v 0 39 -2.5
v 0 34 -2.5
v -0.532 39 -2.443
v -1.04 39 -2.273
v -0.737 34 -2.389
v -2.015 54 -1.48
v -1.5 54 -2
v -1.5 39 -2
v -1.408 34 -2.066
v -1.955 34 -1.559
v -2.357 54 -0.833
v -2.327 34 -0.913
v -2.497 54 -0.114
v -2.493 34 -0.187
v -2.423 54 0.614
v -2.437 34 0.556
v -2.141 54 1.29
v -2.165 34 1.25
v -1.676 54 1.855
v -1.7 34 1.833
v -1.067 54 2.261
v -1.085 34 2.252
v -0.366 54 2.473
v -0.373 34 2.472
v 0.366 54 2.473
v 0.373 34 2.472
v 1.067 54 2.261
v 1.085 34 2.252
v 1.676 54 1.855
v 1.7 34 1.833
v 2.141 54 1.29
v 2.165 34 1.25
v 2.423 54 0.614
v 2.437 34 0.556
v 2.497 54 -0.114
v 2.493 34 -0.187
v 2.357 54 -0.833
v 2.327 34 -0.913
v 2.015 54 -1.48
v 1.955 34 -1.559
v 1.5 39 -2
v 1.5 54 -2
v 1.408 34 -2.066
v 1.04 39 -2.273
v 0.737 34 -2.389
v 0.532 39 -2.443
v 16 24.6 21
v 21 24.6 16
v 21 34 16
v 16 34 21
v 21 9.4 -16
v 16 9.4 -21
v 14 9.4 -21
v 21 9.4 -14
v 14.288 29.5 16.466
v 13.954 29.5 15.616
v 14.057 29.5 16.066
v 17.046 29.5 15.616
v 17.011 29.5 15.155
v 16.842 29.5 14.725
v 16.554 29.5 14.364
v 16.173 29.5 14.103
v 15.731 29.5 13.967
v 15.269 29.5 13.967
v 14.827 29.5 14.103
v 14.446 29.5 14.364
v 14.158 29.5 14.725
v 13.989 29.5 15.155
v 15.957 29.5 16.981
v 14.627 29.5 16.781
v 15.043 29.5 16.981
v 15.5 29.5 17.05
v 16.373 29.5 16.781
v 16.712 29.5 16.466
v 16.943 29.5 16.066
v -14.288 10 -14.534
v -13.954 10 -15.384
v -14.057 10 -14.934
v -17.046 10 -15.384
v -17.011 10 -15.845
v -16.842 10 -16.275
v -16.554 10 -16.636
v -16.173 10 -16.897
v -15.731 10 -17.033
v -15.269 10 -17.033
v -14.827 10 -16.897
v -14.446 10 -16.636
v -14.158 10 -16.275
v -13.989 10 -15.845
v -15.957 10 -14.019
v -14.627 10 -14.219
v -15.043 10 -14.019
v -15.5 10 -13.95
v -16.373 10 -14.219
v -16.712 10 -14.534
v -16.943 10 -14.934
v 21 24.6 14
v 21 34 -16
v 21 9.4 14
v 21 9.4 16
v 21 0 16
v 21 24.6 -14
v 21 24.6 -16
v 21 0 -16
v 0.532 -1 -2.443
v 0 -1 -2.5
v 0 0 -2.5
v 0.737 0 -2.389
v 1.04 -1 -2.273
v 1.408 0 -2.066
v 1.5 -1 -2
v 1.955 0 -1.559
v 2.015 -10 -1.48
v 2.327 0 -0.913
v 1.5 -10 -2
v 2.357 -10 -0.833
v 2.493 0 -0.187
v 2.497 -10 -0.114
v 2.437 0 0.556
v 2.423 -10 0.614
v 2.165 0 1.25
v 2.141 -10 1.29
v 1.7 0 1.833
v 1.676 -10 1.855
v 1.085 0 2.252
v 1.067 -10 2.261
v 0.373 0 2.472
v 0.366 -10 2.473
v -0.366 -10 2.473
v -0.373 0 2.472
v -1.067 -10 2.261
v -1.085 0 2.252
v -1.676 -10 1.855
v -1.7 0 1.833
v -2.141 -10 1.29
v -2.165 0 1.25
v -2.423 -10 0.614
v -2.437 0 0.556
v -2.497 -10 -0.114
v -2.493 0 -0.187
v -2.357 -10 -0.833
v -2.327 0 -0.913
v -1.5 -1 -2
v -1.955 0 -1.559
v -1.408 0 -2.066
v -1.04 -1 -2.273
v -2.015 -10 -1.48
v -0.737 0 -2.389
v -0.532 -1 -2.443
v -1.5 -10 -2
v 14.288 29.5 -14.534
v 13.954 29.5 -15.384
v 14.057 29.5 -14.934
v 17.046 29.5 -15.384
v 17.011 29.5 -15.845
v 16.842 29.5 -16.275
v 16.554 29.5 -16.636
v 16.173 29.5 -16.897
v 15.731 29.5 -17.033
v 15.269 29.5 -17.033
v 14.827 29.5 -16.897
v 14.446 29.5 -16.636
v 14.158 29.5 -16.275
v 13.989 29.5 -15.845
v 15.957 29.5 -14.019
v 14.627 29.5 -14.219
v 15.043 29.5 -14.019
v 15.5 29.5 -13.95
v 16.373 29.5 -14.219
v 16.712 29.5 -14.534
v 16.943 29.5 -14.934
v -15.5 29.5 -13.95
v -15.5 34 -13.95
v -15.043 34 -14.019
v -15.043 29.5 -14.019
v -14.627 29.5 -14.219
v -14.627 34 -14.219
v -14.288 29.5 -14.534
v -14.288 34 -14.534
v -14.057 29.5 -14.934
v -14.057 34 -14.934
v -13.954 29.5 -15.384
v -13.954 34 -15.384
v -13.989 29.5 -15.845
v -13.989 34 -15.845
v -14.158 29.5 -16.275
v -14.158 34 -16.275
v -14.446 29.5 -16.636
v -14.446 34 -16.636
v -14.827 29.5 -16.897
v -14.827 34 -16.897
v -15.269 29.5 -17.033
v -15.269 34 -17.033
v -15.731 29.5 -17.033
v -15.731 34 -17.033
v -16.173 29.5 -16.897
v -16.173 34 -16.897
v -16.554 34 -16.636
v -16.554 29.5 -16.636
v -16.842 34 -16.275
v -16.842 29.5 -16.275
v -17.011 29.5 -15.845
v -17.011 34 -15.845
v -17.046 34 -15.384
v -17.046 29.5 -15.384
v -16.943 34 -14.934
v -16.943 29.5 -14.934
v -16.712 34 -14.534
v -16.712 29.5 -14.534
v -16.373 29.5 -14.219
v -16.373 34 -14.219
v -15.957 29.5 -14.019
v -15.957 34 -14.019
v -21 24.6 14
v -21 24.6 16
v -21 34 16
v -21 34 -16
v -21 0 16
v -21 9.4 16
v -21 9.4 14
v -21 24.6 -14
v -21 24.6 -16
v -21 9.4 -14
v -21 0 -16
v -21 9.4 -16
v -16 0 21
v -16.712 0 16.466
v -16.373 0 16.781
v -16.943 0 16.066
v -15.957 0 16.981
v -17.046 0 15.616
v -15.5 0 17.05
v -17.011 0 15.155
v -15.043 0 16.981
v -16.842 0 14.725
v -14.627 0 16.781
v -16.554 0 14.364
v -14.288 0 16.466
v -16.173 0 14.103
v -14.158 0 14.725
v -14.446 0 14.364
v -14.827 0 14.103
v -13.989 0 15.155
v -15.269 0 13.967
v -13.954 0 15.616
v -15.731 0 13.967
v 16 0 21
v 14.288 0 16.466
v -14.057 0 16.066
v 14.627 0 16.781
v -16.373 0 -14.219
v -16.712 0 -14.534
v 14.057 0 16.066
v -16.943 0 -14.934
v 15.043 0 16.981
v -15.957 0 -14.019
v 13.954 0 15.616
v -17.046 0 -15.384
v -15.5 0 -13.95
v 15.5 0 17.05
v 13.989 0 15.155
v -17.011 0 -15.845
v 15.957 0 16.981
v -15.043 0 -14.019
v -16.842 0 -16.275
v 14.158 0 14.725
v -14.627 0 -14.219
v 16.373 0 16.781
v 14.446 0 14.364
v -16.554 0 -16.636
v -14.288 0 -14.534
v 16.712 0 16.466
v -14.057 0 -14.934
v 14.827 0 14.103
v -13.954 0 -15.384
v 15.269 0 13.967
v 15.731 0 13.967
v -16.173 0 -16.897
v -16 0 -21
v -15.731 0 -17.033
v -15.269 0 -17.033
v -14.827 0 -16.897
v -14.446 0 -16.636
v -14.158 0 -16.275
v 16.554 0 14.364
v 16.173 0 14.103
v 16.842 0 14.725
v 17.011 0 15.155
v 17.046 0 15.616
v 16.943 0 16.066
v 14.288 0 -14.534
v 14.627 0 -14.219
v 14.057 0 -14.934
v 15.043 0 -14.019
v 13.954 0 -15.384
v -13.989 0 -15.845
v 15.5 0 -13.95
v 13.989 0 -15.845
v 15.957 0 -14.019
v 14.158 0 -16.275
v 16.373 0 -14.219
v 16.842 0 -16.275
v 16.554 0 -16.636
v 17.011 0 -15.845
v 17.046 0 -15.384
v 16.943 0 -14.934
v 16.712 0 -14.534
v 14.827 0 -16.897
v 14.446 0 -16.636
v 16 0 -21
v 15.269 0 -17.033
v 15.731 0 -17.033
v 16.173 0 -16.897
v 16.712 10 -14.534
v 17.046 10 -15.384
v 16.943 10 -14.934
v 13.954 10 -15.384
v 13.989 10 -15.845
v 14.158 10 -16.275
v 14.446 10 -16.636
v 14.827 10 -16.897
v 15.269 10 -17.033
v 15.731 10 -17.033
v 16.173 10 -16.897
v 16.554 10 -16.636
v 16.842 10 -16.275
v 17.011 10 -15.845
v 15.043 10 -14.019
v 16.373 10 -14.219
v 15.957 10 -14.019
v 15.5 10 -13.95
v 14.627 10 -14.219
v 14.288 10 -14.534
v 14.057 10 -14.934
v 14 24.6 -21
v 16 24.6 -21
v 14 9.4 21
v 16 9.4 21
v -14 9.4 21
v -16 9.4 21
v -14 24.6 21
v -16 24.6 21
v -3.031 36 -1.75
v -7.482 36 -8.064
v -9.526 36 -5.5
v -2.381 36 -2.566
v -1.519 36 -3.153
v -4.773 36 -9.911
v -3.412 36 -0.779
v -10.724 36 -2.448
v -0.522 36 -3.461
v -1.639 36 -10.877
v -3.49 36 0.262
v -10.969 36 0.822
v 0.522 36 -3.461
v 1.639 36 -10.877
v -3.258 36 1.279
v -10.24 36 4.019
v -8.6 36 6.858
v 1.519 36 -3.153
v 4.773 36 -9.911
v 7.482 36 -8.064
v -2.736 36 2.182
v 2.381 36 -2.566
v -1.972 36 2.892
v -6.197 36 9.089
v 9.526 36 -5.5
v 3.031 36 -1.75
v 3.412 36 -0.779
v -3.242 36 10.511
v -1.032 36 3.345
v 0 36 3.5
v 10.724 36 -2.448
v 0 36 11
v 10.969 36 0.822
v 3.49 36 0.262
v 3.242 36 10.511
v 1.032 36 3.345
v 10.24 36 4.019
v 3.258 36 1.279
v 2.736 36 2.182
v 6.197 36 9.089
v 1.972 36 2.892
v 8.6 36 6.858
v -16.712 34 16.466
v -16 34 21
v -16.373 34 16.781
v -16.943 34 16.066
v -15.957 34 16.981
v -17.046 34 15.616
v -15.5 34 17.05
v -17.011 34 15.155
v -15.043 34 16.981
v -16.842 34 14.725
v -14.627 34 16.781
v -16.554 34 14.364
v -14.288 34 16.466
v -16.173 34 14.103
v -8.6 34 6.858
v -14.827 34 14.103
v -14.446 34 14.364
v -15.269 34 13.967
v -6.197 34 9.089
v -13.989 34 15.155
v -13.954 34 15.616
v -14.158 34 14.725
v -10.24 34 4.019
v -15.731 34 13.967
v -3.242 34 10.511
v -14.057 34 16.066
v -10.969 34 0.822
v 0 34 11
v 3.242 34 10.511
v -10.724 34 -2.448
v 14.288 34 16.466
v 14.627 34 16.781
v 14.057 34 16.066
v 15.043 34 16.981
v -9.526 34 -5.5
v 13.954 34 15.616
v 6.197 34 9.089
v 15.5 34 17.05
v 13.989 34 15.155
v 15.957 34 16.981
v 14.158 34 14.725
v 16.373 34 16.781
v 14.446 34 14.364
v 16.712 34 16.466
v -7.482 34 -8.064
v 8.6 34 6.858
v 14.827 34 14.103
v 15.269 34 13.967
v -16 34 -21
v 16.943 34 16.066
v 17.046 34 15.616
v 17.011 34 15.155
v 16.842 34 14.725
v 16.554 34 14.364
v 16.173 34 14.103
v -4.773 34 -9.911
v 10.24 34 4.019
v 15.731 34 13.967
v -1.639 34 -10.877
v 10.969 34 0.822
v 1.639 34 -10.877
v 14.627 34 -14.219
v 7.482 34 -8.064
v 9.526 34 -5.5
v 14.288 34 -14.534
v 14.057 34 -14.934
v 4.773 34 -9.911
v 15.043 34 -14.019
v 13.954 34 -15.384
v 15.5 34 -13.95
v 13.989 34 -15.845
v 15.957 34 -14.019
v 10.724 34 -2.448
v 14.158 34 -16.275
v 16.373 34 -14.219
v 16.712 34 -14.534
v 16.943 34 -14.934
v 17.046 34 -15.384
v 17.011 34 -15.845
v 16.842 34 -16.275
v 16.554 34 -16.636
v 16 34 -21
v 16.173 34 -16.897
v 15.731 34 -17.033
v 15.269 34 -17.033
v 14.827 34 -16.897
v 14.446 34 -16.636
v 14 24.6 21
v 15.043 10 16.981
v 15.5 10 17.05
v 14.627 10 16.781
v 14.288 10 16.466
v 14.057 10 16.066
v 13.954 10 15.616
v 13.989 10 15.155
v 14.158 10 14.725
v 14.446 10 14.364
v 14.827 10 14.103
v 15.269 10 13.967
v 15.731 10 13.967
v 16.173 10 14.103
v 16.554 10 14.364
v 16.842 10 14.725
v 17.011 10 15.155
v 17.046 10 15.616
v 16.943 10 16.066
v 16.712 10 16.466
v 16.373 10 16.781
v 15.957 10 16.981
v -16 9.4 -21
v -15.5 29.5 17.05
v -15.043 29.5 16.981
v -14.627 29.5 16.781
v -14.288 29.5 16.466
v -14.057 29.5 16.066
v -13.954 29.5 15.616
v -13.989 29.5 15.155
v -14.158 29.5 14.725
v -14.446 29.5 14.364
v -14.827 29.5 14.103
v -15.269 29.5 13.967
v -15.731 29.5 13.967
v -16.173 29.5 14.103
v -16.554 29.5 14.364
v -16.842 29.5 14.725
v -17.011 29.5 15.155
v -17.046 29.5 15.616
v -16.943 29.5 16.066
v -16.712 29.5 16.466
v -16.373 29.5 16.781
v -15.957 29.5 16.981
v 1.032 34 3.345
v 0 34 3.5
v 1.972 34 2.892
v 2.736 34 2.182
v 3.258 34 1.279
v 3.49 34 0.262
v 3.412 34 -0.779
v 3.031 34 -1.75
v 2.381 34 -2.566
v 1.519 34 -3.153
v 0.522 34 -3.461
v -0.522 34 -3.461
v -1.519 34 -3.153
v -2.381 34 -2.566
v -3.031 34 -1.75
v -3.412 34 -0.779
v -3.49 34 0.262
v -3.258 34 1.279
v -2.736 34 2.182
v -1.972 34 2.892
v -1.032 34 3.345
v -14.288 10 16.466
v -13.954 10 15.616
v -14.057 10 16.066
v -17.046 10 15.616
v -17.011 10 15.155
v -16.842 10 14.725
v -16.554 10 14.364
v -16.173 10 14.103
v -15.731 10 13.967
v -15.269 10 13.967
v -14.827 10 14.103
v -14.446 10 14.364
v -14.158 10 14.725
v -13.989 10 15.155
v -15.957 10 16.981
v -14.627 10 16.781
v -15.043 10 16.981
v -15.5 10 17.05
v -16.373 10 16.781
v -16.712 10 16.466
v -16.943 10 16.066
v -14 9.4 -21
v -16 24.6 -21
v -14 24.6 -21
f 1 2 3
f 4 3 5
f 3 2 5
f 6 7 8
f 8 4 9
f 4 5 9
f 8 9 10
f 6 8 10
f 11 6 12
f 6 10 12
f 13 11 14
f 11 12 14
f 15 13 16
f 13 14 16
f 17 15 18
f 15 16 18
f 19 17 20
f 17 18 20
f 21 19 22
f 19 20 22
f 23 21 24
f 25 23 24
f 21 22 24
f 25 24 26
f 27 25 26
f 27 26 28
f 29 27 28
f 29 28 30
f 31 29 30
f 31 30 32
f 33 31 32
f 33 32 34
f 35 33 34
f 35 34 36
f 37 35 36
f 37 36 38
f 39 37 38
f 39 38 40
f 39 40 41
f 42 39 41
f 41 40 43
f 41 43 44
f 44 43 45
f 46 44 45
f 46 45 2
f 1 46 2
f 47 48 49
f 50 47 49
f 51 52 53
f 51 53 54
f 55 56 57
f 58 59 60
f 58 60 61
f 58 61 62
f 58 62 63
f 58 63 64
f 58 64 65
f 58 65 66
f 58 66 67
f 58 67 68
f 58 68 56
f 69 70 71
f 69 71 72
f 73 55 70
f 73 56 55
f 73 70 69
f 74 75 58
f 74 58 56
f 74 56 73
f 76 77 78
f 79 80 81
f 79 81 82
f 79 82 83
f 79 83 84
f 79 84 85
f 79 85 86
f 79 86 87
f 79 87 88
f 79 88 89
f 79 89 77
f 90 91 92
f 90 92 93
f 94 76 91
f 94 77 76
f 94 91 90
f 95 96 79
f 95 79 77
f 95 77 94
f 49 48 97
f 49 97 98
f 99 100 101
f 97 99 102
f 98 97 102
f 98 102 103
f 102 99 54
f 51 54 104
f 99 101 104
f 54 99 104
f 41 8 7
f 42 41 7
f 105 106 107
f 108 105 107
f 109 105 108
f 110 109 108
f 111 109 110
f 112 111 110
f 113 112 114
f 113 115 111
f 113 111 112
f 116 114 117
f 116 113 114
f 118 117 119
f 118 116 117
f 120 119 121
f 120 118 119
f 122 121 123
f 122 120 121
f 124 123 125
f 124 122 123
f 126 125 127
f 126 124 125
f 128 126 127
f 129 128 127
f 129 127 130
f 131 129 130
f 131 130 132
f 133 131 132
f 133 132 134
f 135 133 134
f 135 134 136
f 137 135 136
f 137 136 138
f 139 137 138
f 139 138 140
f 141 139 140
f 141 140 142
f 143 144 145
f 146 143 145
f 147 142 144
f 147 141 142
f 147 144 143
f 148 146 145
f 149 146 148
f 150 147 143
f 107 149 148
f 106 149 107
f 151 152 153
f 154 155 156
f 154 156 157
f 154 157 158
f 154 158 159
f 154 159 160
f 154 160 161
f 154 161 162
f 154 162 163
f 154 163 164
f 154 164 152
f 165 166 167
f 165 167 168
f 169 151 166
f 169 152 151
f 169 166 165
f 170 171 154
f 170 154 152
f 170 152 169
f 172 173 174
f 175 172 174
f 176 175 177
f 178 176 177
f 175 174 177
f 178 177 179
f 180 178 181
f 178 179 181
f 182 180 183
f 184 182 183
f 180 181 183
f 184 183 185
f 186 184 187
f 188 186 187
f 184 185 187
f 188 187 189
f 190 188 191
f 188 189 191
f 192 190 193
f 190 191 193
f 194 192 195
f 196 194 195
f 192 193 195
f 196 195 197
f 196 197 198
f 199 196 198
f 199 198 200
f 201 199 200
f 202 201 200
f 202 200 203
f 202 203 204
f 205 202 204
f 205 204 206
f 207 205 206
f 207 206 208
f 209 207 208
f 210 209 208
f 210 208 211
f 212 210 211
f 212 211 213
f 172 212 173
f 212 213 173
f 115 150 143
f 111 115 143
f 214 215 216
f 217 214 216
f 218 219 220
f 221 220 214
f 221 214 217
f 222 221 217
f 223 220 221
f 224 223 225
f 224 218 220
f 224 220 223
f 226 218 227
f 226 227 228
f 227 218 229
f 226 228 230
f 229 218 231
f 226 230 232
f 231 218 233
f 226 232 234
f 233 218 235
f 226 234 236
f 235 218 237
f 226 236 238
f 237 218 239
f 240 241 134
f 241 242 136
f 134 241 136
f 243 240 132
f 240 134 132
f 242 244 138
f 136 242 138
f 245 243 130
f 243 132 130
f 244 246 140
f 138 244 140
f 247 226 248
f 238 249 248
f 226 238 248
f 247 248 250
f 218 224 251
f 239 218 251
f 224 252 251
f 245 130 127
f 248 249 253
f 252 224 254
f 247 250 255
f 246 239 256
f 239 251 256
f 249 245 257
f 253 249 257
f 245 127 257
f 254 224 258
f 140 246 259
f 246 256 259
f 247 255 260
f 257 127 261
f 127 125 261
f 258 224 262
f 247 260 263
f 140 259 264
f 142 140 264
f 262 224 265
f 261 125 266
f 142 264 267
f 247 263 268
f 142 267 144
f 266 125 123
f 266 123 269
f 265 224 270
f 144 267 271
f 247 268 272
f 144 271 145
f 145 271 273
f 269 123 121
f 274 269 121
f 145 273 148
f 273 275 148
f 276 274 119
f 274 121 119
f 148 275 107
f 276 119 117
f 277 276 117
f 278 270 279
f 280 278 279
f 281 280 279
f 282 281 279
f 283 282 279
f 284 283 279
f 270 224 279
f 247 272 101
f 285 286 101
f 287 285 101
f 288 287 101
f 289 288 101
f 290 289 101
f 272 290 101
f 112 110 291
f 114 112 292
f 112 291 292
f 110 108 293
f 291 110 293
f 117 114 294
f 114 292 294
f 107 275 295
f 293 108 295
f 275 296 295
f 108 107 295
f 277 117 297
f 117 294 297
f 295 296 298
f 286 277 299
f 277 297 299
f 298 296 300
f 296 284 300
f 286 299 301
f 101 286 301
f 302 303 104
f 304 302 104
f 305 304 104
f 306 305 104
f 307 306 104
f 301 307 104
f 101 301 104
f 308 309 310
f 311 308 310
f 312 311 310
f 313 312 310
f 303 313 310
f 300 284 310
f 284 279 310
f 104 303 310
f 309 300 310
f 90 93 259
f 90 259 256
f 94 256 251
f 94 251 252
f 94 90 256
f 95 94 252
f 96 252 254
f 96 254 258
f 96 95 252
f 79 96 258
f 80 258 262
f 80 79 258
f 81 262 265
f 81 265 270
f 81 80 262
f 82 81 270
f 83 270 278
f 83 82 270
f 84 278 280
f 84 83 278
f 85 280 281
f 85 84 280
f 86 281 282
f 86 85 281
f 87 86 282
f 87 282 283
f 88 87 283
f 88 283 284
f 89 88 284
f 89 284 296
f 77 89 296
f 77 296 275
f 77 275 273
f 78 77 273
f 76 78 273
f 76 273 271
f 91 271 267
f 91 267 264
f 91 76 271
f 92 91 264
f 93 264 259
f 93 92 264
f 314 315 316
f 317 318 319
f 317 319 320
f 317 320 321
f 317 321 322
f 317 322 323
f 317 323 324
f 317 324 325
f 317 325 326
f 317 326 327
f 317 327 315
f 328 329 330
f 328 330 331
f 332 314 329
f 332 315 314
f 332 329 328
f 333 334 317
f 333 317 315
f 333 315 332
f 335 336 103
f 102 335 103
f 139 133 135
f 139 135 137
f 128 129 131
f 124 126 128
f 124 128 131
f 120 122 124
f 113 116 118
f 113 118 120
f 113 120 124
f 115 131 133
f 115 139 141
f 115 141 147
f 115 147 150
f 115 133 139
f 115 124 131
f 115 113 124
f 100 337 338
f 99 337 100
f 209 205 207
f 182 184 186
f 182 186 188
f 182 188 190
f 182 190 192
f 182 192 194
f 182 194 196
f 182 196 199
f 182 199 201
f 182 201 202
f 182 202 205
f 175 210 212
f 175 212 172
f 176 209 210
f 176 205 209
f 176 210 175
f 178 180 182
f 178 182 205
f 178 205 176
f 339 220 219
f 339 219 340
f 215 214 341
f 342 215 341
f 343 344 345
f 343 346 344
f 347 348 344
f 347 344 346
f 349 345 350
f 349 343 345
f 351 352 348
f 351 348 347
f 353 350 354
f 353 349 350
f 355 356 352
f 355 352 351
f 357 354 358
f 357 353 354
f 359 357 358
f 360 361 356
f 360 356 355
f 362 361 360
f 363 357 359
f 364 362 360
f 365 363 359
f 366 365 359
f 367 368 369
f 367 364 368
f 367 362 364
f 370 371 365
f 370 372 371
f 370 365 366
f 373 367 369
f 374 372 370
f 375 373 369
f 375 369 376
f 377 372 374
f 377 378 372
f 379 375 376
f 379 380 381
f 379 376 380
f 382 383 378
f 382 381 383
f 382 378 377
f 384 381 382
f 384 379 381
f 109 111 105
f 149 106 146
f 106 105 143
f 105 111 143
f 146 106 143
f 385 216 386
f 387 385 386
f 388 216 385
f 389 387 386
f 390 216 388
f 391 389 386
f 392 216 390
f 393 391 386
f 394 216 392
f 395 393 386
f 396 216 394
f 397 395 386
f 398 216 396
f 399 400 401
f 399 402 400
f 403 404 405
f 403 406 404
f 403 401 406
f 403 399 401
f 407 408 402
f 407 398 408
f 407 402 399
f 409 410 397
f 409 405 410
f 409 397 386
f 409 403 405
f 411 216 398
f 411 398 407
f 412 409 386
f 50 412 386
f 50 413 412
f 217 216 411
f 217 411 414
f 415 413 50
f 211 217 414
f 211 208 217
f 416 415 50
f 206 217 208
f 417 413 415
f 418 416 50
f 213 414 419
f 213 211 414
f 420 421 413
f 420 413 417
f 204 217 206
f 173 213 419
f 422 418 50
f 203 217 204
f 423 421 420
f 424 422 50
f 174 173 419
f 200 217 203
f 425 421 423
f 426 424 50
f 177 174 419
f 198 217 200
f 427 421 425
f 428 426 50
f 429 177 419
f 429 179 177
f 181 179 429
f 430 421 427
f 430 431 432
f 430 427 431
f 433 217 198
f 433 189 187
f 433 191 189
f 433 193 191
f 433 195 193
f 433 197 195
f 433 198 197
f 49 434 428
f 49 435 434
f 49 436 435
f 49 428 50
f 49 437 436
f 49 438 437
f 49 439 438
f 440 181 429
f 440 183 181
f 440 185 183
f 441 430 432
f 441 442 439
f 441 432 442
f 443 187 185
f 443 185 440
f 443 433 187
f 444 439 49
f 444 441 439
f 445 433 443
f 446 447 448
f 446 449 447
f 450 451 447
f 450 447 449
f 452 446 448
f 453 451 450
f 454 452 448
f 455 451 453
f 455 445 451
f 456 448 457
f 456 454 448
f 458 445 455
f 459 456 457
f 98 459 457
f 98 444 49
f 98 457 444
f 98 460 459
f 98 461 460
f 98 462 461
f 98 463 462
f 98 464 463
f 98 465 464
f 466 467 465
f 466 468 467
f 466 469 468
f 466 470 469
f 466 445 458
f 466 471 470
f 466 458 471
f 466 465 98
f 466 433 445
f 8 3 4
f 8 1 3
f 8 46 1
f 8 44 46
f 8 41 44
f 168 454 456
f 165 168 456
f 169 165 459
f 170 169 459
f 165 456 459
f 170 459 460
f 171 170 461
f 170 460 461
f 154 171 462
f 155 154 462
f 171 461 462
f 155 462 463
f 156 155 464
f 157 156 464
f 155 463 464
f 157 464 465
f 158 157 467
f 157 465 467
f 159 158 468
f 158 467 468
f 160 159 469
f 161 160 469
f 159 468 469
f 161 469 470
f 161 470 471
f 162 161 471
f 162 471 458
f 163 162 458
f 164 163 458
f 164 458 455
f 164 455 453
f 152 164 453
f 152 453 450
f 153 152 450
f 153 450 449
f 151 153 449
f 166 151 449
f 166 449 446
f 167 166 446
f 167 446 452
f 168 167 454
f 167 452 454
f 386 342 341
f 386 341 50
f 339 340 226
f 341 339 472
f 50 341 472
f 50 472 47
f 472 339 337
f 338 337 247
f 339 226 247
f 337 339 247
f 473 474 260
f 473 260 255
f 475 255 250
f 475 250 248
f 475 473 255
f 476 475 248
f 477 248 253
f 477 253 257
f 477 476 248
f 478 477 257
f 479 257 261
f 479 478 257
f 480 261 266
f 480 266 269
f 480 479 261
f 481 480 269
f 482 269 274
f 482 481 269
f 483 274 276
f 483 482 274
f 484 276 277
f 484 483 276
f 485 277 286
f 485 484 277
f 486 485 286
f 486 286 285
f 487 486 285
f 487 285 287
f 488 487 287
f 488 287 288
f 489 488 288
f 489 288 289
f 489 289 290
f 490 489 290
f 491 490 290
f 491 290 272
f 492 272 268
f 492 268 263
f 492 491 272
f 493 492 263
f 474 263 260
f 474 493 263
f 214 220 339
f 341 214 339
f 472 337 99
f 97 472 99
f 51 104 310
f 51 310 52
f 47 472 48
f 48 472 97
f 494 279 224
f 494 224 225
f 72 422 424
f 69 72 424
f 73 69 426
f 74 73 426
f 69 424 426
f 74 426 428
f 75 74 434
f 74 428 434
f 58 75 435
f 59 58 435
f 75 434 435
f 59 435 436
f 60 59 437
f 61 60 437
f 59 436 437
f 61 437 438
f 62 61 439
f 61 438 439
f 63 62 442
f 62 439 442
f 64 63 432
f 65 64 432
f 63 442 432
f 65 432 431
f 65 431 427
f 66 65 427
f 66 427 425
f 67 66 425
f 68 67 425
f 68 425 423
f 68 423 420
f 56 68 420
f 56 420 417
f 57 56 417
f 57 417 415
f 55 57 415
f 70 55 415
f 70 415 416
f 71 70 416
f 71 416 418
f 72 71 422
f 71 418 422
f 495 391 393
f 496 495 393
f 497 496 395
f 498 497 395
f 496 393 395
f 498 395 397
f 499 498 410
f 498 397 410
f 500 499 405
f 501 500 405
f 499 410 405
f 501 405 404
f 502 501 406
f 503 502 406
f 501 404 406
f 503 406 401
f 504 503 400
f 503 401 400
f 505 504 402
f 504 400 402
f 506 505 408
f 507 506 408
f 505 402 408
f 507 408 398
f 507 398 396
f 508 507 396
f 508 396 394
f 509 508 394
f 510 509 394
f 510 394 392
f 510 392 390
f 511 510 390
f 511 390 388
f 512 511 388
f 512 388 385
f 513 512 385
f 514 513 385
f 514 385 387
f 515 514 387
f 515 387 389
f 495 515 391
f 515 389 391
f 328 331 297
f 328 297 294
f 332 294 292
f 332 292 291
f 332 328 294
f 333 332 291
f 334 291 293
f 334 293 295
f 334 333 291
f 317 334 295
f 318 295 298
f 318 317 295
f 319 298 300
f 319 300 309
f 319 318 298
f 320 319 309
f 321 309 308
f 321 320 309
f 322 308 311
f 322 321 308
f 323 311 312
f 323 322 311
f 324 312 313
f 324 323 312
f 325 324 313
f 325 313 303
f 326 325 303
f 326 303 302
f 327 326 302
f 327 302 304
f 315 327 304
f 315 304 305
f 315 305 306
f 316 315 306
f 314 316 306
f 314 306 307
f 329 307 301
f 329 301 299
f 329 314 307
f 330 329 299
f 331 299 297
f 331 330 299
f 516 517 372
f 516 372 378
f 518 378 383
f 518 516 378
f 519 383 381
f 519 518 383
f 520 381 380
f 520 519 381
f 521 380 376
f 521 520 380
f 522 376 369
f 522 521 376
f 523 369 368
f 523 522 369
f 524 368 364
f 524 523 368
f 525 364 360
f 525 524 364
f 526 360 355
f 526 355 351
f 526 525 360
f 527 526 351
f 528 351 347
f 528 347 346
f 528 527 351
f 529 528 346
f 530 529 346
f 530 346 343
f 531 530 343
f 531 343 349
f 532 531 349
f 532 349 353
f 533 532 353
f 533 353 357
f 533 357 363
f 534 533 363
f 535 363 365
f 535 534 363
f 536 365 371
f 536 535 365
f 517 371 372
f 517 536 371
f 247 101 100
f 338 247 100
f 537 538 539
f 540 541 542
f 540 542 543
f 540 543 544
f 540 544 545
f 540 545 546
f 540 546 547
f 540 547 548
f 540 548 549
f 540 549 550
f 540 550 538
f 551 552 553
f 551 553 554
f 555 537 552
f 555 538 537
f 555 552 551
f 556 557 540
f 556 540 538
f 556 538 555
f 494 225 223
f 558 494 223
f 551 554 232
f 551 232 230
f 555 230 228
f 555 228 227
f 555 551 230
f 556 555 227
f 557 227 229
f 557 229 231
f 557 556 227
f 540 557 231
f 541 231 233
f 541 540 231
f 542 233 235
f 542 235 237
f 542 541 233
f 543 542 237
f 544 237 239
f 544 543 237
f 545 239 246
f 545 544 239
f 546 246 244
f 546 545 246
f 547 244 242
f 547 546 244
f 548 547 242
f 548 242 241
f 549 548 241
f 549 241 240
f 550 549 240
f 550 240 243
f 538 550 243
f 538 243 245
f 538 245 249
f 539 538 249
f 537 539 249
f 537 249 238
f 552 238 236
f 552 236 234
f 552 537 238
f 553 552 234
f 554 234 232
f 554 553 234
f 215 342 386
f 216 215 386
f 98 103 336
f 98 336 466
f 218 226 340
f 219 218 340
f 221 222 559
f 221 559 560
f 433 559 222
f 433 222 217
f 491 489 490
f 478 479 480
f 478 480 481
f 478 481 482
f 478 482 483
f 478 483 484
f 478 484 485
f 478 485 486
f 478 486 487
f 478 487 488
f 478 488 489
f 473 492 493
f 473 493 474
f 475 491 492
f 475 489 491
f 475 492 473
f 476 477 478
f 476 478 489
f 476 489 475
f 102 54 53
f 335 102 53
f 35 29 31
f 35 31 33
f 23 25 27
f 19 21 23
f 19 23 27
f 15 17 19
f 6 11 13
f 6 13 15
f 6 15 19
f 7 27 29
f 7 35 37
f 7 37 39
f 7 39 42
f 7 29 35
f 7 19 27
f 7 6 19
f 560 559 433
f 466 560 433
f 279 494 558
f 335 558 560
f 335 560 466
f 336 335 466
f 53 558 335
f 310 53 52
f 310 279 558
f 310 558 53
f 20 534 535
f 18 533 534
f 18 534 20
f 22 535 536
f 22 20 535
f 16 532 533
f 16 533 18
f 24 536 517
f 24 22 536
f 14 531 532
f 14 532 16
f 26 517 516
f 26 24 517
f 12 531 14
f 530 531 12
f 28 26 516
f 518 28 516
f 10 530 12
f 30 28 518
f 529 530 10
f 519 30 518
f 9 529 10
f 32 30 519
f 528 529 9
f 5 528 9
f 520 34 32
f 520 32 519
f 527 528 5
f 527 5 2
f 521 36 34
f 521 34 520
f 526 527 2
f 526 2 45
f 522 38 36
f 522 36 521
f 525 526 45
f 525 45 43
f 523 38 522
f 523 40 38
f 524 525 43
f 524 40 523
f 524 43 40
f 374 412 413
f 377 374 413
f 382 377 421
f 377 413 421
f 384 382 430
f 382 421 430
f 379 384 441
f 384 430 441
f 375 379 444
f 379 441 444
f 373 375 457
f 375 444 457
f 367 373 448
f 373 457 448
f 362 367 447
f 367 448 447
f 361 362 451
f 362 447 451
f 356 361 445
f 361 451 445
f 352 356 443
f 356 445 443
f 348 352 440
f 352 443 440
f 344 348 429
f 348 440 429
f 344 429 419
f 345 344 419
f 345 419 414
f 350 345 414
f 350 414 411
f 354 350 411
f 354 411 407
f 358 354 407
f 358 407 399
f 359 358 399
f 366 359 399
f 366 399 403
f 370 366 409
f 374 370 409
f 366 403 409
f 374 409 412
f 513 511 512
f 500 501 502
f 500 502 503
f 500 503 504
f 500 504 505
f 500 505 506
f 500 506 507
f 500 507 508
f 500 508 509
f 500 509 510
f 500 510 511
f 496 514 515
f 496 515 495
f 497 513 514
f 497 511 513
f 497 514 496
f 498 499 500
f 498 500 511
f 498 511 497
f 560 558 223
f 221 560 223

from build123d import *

# Parameters (mm, degrees)
SKETCH4_W               = 42
SKETCH4_H               = 42
BOTTOM_DEPTH            = 9.4
MIDDLE_DEPTH            = 15.2
SKETCH8_W               = 42
SKETCH8_H               = 42
TOP_DEPTH               = 9.4
CHAMFER1_SIZE           = 5
SKETCH9_R               = 11
SKETCH9_R_2             = 3.5
RING_DEPTH              = 2
SKETCH10_R              = 2.5
SHAFT_DEPTH             = 20
SKETCH12_R              = 1.55
CUT_EXTRUDE4_DEPTH      = 4.5
CUT_EXTRUDE5_START      = -10
SKETCH15_R              = 1.55
CUT_EXTRUDE5_DEPTH      = 10
BOSS_EXTRUDE1_START     = 10
SKETCH16_R              = 2.5
BOSS_EXTRUDE1_DEPTH     = 10
CUT_EXTRUDE3_DEPTH      = 5
CUT_EXTRUDE3_DEPTH_BACK = 5
SKETCH11_W              = 1.458446266
SKETCH11_H              = 24.242457261
SKETCH11_W_2            = 8.851647276
SKETCH11_H_2            = 12.03282496


with BuildPart() as part:
    # Sketch4 → Bottom (new body)
    with BuildSketch(Plane(origin=(0, 0, 0), x_dir=(1, 0, 0), z_dir=(0, 1, 0))):
        Rectangle(SKETCH4_W, SKETCH4_H)
    extrude(amount=BOTTOM_DEPTH)

    # Sketch6 → Middle (add)
    with BuildSketch(Plane(origin=(0, 9.4, 0), x_dir=(1, 0, 0), z_dir=(0, 1, 0))):
        Polygon((-21, -14), (-14, -21), (14, -21), (21, -14), (21, 14), (14, 21), (-14, 21), (-21, 14), align=None)
    extrude(amount=MIDDLE_DEPTH)

    # Sketch8 → Top (add)
    with BuildSketch(Plane(origin=(0, 24.6, 0), x_dir=(1, 0, 0), z_dir=(0, 1, 0))):
        Rectangle(SKETCH8_W, SKETCH8_H)
    extrude(amount=TOP_DEPTH)

    # Chamfer1
    chamfer1_edges = [part.edges().sort_by_distance(p)[0] for p in [
        (21, 29.3, 21),
        (21, 29.3, -21),
        (-21, 29.3, -21),
        (-21, 29.3, 21),
        (-21, 4.7, 21),
        (-21, 4.7, -21),
        (21, 4.7, -21),
        (21, 4.7, 21),
    ]]
    chamfer(chamfer1_edges, length=CHAMFER1_SIZE)

    # Sketch9 → Ring (add)
    with BuildSketch(Plane(origin=(0, 34, 0), x_dir=(1, 0, 0), z_dir=(0, 1, 0))):
        with Locations(Location((0, 0, 0), (0, 0, 270))):
            Circle(SKETCH9_R)
        with Locations(Location((0, 0, 0), (0, 0, 270))):
            Circle(SKETCH9_R_2, mode=Mode.SUBTRACT)
    extrude(amount=RING_DEPTH)

    # Sketch10 → Shaft (add)
    with BuildSketch(Plane(origin=(0, 34, 0), x_dir=(1, 0, 0), z_dir=(0, 1, 0))):
        with Locations(Location((0, 0, 0), (0, 0, 90))):
            Circle(SKETCH10_R)
    extrude(amount=SHAFT_DEPTH)

    # Sketch12 → Cut-Extrude4 (cut)
    with BuildSketch(Plane(origin=(0, 34, 0), x_dir=(1, 0, 0), z_dir=(0, 1, 0))):
        with Locations(Location((15.5, -15.5, 0), (0, 0, 270))):
            Circle(SKETCH12_R)
        with Locations(Location((-15.5, -15.5, 0), (0, 0, 270))):
            Circle(SKETCH12_R)
        with Locations(Location((-15.5, 15.5, 0), (0, 0, 270))):
            Circle(SKETCH12_R)
        with Locations(Location((15.5, 15.5, 0), (0, 0, 270))):
            Circle(SKETCH12_R)
    extrude(amount=-CUT_EXTRUDE4_DEPTH, mode=Mode.SUBTRACT)

    # Sketch15 → Cut-Extrude5 (cut)
    with BuildSketch(Plane.XZ.offset(CUT_EXTRUDE5_START)):
        with Locations(Location((15.5, 15.5, 0), (0, 0, 90))):
            Circle(SKETCH15_R)
        with Locations(Location((15.5, -15.5, 0), (0, 0, 90))):
            Circle(SKETCH15_R)
        with Locations(Location((-15.5, 15.5, 0), (0, 0, 90))):
            Circle(SKETCH15_R)
        with Locations(Location((-15.5, -15.5, 0), (0, 0, 90))):
            Circle(SKETCH15_R)
    extrude(amount=CUT_EXTRUDE5_DEPTH, mode=Mode.SUBTRACT)

    # Sketch16 → Boss-Extrude1 (add)
    with BuildSketch(Plane(origin=(0, 0, 0), x_dir=(-1, 0, 0), z_dir=(0, -1, 0)).offset(BOSS_EXTRUDE1_START)):
        with Locations(Location((0, 0, 0), (0, 0, 90))):
            Circle(SKETCH16_R)
    extrude(amount=-BOSS_EXTRUDE1_DEPTH)

    # Sketch11 → Cut-Extrude3 (cut, two sides: drawn at the far end of the back side and taken through both)
    with BuildSketch(Plane(origin=(0, 0, 0), x_dir=(0, 0, -1), z_dir=(1, 0, 0)).offset(-CUT_EXTRUDE3_DEPTH_BACK)):
        with Locations((2.729223133, 51.12122863)):
            Rectangle(SKETCH11_W, SKETCH11_H)
        with Locations((6.425823638, -7.01641248)):
            Rectangle(SKETCH11_W_2, SKETCH11_H_2)
    extrude(amount=CUT_EXTRUDE3_DEPTH + CUT_EXTRUDE3_DEPTH_BACK, mode=Mode.SUBTRACT)


solid = part.part
